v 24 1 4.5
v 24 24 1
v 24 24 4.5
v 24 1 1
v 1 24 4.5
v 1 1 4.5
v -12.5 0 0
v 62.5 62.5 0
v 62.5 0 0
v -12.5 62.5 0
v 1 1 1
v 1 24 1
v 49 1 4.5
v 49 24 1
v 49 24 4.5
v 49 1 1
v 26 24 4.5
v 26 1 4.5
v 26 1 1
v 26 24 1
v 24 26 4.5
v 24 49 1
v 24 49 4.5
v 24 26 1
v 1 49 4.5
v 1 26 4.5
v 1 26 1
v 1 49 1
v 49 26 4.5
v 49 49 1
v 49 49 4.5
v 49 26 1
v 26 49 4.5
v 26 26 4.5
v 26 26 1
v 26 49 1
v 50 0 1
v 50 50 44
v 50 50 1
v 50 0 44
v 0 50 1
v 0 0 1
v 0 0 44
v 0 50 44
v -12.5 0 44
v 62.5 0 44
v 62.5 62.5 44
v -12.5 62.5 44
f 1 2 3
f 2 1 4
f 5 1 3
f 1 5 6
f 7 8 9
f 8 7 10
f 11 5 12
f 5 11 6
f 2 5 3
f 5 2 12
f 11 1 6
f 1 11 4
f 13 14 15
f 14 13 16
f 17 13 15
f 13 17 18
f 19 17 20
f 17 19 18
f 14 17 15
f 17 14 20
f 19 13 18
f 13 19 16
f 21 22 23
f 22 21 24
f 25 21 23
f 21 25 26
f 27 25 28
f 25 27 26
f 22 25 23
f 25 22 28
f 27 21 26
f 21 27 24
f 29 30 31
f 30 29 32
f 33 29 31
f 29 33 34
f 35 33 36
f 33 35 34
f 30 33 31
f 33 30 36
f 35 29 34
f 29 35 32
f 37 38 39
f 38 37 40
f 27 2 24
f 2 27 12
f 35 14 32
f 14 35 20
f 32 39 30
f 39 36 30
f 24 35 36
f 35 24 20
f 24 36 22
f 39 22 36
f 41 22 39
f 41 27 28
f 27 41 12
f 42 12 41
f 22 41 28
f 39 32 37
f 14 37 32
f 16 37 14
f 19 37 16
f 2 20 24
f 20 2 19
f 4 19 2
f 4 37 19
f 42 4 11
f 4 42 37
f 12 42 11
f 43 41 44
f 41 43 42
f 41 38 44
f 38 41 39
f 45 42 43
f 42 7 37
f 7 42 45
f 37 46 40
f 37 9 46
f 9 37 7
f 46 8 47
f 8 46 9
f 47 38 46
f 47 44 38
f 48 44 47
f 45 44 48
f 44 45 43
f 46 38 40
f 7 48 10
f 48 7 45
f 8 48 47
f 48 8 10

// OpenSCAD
color("LightGray") {
    translate([1,1,0]) cube([23,23,4.5]);
    translate([25+1,1,0]) cube([23,23,4.5]);
    translate([1,25+1,0]) cube([23,23,4.5]);
    translate([25+1,25+1,0]) cube([23,23,4.5]);
}
color("Grey") {
    cube([50,50,7-6]);
    translate([-12.5,50,0]) cube([50+25,12.5,50-6]);
    translate([50,0,0]) cube([12.5,50,50-6]);
    translate([-12.5,0,0]) cube([12.5,50,50-6]);
}
